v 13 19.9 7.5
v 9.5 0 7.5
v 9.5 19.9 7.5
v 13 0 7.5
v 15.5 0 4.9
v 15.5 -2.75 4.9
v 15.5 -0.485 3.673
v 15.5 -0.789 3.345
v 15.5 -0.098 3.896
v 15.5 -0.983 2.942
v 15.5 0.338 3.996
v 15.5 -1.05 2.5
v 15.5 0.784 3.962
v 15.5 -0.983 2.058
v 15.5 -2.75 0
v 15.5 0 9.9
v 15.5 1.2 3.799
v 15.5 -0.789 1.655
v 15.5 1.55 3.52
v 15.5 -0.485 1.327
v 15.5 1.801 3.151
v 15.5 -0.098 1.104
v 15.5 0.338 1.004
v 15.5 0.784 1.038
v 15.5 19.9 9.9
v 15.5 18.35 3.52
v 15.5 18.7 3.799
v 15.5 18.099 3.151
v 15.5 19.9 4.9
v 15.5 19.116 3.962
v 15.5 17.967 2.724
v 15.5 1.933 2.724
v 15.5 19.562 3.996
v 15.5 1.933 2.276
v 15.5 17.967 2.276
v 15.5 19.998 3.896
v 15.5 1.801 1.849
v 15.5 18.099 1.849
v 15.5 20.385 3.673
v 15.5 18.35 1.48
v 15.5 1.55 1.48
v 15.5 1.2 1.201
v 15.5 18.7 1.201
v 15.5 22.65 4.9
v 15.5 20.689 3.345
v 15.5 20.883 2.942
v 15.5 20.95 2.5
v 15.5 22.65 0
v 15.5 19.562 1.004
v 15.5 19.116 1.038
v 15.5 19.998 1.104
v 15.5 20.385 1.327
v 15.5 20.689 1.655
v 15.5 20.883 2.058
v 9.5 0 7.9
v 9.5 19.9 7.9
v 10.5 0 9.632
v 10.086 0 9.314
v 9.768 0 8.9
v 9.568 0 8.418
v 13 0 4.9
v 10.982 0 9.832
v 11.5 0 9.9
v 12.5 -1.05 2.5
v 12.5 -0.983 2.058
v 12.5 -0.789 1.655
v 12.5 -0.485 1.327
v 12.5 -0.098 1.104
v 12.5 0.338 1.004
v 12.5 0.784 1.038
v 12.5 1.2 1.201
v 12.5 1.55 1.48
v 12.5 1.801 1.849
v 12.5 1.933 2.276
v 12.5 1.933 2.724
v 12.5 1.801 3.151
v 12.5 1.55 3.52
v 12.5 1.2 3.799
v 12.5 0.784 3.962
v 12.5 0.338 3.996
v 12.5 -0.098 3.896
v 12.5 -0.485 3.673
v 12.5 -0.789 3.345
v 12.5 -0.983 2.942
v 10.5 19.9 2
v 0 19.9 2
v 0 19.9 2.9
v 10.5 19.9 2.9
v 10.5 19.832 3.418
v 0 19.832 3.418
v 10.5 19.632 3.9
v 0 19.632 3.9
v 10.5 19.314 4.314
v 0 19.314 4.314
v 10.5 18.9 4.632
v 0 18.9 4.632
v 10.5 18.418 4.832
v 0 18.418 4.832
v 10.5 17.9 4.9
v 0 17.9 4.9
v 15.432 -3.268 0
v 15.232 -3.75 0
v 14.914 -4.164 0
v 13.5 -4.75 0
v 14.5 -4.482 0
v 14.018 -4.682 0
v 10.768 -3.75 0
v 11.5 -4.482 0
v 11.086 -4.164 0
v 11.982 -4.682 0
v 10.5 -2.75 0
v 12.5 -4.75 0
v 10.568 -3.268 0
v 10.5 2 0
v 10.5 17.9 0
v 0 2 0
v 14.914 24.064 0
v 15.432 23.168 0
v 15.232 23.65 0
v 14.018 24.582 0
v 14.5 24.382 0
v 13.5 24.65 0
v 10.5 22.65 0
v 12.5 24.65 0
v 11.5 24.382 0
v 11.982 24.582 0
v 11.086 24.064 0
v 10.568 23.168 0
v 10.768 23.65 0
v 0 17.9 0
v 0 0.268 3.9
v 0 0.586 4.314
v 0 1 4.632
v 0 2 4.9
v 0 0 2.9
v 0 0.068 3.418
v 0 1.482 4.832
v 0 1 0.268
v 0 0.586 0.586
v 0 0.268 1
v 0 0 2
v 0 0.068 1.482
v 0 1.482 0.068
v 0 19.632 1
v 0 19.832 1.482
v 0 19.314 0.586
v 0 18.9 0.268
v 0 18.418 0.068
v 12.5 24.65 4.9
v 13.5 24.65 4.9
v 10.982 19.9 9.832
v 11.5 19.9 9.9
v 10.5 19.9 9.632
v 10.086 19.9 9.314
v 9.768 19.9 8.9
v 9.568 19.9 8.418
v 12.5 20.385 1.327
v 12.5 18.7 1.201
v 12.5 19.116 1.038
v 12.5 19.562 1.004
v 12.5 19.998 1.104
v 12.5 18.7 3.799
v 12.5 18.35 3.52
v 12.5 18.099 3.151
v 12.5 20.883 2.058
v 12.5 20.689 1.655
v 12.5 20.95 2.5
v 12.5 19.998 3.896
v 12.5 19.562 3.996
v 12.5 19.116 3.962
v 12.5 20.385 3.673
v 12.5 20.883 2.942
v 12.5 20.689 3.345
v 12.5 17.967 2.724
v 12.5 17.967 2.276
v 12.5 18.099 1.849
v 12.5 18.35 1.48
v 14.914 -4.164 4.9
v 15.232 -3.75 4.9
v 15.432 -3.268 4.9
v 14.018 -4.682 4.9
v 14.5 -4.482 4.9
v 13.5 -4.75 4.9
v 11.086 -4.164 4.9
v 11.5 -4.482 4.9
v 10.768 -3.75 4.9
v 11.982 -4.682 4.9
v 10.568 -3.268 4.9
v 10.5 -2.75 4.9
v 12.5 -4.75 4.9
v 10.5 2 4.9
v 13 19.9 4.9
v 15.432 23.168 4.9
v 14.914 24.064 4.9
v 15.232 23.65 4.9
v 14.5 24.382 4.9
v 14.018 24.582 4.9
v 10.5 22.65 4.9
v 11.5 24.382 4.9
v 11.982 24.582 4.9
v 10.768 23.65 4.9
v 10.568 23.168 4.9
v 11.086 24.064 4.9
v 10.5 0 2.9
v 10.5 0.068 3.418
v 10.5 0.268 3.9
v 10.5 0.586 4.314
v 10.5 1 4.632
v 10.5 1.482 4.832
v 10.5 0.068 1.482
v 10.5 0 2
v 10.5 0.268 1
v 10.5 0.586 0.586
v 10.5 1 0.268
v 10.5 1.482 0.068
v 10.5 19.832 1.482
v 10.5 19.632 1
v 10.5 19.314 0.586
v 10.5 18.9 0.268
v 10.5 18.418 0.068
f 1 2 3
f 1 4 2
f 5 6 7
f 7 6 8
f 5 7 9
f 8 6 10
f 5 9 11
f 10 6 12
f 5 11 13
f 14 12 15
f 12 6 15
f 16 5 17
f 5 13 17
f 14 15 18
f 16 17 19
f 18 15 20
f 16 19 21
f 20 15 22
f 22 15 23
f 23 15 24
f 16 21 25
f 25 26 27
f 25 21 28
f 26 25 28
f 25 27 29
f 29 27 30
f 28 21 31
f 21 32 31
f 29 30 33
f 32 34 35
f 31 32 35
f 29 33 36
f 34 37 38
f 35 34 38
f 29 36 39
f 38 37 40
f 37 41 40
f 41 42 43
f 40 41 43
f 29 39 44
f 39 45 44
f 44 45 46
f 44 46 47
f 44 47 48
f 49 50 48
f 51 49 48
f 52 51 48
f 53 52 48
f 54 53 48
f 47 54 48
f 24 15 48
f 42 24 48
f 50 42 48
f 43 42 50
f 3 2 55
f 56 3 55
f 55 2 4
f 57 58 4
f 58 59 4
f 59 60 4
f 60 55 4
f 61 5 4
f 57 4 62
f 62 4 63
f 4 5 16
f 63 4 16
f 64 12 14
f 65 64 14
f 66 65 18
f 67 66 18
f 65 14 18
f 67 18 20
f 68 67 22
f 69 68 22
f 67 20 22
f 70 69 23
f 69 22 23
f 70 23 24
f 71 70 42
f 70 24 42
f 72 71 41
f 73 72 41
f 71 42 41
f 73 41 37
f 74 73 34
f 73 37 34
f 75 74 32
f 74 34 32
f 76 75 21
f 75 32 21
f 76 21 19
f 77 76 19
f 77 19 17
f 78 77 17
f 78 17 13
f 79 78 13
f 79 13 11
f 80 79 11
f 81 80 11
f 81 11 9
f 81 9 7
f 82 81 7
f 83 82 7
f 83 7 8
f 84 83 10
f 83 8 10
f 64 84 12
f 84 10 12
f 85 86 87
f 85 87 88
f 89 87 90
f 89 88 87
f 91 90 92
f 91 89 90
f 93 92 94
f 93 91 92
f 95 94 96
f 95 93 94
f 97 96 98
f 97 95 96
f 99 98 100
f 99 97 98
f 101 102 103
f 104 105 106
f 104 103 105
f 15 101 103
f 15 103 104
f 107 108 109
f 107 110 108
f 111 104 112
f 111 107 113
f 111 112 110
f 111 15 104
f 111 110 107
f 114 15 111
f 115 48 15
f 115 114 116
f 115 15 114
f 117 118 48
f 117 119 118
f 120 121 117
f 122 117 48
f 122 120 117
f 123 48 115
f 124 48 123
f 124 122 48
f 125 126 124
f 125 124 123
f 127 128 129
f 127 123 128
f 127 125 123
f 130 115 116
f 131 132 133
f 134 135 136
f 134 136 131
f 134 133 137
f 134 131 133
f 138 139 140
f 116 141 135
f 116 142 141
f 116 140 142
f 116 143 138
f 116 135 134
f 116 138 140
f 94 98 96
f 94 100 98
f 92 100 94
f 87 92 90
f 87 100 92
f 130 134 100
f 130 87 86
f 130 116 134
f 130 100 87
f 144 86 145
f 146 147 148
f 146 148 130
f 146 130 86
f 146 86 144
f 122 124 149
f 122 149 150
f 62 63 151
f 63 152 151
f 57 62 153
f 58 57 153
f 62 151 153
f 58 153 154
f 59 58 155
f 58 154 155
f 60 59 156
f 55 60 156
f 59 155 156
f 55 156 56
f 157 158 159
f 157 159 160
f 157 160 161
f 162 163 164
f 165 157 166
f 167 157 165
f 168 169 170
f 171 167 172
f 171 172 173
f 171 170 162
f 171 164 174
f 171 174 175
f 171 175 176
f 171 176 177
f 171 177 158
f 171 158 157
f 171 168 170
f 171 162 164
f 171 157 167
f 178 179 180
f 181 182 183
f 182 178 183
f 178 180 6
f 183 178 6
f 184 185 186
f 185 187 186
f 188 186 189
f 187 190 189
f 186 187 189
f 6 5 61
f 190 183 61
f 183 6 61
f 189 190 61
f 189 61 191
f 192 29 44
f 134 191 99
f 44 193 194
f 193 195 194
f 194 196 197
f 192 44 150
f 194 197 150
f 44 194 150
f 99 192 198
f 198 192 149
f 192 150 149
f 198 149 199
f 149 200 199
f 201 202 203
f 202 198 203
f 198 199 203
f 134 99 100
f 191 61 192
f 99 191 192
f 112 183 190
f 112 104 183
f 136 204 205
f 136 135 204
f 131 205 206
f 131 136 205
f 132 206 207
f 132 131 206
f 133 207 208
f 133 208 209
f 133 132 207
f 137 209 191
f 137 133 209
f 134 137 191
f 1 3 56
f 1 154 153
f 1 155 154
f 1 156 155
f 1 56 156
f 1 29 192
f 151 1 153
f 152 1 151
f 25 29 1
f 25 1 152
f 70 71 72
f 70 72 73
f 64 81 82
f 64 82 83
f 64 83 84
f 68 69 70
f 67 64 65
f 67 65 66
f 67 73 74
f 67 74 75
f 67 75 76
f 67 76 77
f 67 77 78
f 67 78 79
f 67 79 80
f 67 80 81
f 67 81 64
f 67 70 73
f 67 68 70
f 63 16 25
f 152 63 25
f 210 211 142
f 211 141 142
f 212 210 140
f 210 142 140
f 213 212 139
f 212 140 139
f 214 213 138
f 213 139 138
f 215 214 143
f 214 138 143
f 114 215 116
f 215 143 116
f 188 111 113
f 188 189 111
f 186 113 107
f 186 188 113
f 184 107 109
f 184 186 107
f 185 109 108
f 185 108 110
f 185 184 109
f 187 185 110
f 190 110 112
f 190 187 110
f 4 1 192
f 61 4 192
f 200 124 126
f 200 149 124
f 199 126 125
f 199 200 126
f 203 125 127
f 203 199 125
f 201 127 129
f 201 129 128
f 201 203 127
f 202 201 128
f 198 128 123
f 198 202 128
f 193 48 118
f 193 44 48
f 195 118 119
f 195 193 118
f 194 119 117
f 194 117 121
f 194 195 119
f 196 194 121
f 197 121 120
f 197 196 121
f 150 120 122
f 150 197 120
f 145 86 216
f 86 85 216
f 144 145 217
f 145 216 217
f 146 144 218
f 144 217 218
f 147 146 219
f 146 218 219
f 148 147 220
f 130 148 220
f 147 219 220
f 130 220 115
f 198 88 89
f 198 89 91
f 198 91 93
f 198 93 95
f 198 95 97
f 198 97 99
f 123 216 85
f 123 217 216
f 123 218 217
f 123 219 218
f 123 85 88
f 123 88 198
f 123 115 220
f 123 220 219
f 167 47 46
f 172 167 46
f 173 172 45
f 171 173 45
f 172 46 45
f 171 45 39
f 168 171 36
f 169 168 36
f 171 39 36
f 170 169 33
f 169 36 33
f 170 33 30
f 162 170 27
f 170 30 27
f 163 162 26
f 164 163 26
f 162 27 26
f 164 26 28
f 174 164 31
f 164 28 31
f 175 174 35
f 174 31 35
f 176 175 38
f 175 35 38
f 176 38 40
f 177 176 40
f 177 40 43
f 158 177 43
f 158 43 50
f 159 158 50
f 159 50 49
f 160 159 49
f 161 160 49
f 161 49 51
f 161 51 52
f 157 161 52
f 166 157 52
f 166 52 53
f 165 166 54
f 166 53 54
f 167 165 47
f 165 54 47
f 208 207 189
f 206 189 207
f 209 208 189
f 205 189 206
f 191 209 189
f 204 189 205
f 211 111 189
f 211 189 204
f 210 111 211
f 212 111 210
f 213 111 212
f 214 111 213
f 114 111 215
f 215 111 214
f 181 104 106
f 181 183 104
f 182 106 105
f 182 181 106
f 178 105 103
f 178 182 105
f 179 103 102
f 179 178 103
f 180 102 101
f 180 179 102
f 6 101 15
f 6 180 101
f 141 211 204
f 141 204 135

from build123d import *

# Parameters (mm, degrees)
EXTRUDE_1_DEPTH     = 4.9
FILLET_1_R          = 2
SKETCH_3_R          = 1.5
CUT_EXTRUDE_1_DEPTH = 3
SKETCH_4_W          = 5
SKETCH_4_H          = 19.9
EXTRUDE_2_DEPTH     = 5
SKETCH_5_W          = 2.5
SKETCH_5_H          = 2.6
CUT_EXTRUDE_2_DEPTH = 31.755202812
FILLET_3_R          = 2
SKETCH_6_W          = 2.4
SKETCH_6_H          = 19.9
EXTRUDE_3_DEPTH     = 1
FILLET_4_R          = 2


with BuildPart() as part:
    # 草图2 → 凸台-拉伸1 (new body)
    with BuildSketch(Plane.XY):
        Polygon((0, 0), (0, 19.9), (10.5, 19.9), (10.5, 24.65), (15.5, 24.65), (15.5, -4.75), (10.5, -4.75), (10.5, 0), align=None)
    extrude(amount=EXTRUDE_1_DEPTH)

    # 圆角1
    fillet_1_edges = [part.edges().sort_by_distance(p)[0] for p in [
        (5.25, 0, 0),
        (5.25, 19.9, 4.9),
        (5.25, 0, 4.9),
        (5.25, 19.9, 0),
    ]]
    fillet(fillet_1_edges, radius=FILLET_1_R)

    # 草图3 → 切除-拉伸1 (cut)
    with BuildSketch(Plane(origin=(15.5, 0, 0), x_dir=(0, 0, -1), z_dir=(1, 0, 0))):
        with Locations(Location((-2.5, 19.45, 0), (0, 0, 90))):
            Circle(SKETCH_3_R)
        with Locations(Location((-2.5, 0.45, 0), (0, 0, 270))):
            Circle(SKETCH_3_R)
    extrude(amount=-CUT_EXTRUDE_1_DEPTH, mode=Mode.SUBTRACT)

    # 草图4 → 凸台-拉伸2 (add)
    with BuildSketch(Plane.XY.offset(4.9)):
        with Locations((13, 9.95)):
            Rectangle(SKETCH_4_W, SKETCH_4_H)
    extrude(amount=EXTRUDE_2_DEPTH)

    # 草图5 → 切除-拉伸2 (cut, through all)
    with BuildSketch(Plane(origin=(0, 19.9, 0), x_dir=(1, 0, 0), z_dir=(0, 1, 0))):
        with Locations((11.75, -6.2)):
            Rectangle(SKETCH_5_W, SKETCH_5_H)
    extrude(amount=-CUT_EXTRUDE_2_DEPTH, mode=Mode.SUBTRACT)

    # 圆角3
    fillet_3_edges = [part.edges().sort_by_distance(p)[0] for p in [
        (10.5, 24.65, 2.45),
        (15.5, 24.65, 2.45),
        (15.5, -4.75, 2.45),
        (10.5, -4.75, 2.45),
    ]]
    fillet(fillet_3_edges, radius=FILLET_3_R)

    # 草图6 → 凸台-拉伸3 (add)
    with BuildSketch(Plane.ZY.offset(-10.5)):
        with Locations((8.7, 9.95)):
            Rectangle(SKETCH_6_W, SKETCH_6_H)
    extrude(amount=EXTRUDE_3_DEPTH)

    # 圆角4
    fillet_4_edges = [part.edges().sort_by_distance(p)[0] for p in [
        (9.5, 9.95, 9.9),
    ]]
    fillet(fillet_4_edges, radius=FILLET_4_R)


solid = part.part
